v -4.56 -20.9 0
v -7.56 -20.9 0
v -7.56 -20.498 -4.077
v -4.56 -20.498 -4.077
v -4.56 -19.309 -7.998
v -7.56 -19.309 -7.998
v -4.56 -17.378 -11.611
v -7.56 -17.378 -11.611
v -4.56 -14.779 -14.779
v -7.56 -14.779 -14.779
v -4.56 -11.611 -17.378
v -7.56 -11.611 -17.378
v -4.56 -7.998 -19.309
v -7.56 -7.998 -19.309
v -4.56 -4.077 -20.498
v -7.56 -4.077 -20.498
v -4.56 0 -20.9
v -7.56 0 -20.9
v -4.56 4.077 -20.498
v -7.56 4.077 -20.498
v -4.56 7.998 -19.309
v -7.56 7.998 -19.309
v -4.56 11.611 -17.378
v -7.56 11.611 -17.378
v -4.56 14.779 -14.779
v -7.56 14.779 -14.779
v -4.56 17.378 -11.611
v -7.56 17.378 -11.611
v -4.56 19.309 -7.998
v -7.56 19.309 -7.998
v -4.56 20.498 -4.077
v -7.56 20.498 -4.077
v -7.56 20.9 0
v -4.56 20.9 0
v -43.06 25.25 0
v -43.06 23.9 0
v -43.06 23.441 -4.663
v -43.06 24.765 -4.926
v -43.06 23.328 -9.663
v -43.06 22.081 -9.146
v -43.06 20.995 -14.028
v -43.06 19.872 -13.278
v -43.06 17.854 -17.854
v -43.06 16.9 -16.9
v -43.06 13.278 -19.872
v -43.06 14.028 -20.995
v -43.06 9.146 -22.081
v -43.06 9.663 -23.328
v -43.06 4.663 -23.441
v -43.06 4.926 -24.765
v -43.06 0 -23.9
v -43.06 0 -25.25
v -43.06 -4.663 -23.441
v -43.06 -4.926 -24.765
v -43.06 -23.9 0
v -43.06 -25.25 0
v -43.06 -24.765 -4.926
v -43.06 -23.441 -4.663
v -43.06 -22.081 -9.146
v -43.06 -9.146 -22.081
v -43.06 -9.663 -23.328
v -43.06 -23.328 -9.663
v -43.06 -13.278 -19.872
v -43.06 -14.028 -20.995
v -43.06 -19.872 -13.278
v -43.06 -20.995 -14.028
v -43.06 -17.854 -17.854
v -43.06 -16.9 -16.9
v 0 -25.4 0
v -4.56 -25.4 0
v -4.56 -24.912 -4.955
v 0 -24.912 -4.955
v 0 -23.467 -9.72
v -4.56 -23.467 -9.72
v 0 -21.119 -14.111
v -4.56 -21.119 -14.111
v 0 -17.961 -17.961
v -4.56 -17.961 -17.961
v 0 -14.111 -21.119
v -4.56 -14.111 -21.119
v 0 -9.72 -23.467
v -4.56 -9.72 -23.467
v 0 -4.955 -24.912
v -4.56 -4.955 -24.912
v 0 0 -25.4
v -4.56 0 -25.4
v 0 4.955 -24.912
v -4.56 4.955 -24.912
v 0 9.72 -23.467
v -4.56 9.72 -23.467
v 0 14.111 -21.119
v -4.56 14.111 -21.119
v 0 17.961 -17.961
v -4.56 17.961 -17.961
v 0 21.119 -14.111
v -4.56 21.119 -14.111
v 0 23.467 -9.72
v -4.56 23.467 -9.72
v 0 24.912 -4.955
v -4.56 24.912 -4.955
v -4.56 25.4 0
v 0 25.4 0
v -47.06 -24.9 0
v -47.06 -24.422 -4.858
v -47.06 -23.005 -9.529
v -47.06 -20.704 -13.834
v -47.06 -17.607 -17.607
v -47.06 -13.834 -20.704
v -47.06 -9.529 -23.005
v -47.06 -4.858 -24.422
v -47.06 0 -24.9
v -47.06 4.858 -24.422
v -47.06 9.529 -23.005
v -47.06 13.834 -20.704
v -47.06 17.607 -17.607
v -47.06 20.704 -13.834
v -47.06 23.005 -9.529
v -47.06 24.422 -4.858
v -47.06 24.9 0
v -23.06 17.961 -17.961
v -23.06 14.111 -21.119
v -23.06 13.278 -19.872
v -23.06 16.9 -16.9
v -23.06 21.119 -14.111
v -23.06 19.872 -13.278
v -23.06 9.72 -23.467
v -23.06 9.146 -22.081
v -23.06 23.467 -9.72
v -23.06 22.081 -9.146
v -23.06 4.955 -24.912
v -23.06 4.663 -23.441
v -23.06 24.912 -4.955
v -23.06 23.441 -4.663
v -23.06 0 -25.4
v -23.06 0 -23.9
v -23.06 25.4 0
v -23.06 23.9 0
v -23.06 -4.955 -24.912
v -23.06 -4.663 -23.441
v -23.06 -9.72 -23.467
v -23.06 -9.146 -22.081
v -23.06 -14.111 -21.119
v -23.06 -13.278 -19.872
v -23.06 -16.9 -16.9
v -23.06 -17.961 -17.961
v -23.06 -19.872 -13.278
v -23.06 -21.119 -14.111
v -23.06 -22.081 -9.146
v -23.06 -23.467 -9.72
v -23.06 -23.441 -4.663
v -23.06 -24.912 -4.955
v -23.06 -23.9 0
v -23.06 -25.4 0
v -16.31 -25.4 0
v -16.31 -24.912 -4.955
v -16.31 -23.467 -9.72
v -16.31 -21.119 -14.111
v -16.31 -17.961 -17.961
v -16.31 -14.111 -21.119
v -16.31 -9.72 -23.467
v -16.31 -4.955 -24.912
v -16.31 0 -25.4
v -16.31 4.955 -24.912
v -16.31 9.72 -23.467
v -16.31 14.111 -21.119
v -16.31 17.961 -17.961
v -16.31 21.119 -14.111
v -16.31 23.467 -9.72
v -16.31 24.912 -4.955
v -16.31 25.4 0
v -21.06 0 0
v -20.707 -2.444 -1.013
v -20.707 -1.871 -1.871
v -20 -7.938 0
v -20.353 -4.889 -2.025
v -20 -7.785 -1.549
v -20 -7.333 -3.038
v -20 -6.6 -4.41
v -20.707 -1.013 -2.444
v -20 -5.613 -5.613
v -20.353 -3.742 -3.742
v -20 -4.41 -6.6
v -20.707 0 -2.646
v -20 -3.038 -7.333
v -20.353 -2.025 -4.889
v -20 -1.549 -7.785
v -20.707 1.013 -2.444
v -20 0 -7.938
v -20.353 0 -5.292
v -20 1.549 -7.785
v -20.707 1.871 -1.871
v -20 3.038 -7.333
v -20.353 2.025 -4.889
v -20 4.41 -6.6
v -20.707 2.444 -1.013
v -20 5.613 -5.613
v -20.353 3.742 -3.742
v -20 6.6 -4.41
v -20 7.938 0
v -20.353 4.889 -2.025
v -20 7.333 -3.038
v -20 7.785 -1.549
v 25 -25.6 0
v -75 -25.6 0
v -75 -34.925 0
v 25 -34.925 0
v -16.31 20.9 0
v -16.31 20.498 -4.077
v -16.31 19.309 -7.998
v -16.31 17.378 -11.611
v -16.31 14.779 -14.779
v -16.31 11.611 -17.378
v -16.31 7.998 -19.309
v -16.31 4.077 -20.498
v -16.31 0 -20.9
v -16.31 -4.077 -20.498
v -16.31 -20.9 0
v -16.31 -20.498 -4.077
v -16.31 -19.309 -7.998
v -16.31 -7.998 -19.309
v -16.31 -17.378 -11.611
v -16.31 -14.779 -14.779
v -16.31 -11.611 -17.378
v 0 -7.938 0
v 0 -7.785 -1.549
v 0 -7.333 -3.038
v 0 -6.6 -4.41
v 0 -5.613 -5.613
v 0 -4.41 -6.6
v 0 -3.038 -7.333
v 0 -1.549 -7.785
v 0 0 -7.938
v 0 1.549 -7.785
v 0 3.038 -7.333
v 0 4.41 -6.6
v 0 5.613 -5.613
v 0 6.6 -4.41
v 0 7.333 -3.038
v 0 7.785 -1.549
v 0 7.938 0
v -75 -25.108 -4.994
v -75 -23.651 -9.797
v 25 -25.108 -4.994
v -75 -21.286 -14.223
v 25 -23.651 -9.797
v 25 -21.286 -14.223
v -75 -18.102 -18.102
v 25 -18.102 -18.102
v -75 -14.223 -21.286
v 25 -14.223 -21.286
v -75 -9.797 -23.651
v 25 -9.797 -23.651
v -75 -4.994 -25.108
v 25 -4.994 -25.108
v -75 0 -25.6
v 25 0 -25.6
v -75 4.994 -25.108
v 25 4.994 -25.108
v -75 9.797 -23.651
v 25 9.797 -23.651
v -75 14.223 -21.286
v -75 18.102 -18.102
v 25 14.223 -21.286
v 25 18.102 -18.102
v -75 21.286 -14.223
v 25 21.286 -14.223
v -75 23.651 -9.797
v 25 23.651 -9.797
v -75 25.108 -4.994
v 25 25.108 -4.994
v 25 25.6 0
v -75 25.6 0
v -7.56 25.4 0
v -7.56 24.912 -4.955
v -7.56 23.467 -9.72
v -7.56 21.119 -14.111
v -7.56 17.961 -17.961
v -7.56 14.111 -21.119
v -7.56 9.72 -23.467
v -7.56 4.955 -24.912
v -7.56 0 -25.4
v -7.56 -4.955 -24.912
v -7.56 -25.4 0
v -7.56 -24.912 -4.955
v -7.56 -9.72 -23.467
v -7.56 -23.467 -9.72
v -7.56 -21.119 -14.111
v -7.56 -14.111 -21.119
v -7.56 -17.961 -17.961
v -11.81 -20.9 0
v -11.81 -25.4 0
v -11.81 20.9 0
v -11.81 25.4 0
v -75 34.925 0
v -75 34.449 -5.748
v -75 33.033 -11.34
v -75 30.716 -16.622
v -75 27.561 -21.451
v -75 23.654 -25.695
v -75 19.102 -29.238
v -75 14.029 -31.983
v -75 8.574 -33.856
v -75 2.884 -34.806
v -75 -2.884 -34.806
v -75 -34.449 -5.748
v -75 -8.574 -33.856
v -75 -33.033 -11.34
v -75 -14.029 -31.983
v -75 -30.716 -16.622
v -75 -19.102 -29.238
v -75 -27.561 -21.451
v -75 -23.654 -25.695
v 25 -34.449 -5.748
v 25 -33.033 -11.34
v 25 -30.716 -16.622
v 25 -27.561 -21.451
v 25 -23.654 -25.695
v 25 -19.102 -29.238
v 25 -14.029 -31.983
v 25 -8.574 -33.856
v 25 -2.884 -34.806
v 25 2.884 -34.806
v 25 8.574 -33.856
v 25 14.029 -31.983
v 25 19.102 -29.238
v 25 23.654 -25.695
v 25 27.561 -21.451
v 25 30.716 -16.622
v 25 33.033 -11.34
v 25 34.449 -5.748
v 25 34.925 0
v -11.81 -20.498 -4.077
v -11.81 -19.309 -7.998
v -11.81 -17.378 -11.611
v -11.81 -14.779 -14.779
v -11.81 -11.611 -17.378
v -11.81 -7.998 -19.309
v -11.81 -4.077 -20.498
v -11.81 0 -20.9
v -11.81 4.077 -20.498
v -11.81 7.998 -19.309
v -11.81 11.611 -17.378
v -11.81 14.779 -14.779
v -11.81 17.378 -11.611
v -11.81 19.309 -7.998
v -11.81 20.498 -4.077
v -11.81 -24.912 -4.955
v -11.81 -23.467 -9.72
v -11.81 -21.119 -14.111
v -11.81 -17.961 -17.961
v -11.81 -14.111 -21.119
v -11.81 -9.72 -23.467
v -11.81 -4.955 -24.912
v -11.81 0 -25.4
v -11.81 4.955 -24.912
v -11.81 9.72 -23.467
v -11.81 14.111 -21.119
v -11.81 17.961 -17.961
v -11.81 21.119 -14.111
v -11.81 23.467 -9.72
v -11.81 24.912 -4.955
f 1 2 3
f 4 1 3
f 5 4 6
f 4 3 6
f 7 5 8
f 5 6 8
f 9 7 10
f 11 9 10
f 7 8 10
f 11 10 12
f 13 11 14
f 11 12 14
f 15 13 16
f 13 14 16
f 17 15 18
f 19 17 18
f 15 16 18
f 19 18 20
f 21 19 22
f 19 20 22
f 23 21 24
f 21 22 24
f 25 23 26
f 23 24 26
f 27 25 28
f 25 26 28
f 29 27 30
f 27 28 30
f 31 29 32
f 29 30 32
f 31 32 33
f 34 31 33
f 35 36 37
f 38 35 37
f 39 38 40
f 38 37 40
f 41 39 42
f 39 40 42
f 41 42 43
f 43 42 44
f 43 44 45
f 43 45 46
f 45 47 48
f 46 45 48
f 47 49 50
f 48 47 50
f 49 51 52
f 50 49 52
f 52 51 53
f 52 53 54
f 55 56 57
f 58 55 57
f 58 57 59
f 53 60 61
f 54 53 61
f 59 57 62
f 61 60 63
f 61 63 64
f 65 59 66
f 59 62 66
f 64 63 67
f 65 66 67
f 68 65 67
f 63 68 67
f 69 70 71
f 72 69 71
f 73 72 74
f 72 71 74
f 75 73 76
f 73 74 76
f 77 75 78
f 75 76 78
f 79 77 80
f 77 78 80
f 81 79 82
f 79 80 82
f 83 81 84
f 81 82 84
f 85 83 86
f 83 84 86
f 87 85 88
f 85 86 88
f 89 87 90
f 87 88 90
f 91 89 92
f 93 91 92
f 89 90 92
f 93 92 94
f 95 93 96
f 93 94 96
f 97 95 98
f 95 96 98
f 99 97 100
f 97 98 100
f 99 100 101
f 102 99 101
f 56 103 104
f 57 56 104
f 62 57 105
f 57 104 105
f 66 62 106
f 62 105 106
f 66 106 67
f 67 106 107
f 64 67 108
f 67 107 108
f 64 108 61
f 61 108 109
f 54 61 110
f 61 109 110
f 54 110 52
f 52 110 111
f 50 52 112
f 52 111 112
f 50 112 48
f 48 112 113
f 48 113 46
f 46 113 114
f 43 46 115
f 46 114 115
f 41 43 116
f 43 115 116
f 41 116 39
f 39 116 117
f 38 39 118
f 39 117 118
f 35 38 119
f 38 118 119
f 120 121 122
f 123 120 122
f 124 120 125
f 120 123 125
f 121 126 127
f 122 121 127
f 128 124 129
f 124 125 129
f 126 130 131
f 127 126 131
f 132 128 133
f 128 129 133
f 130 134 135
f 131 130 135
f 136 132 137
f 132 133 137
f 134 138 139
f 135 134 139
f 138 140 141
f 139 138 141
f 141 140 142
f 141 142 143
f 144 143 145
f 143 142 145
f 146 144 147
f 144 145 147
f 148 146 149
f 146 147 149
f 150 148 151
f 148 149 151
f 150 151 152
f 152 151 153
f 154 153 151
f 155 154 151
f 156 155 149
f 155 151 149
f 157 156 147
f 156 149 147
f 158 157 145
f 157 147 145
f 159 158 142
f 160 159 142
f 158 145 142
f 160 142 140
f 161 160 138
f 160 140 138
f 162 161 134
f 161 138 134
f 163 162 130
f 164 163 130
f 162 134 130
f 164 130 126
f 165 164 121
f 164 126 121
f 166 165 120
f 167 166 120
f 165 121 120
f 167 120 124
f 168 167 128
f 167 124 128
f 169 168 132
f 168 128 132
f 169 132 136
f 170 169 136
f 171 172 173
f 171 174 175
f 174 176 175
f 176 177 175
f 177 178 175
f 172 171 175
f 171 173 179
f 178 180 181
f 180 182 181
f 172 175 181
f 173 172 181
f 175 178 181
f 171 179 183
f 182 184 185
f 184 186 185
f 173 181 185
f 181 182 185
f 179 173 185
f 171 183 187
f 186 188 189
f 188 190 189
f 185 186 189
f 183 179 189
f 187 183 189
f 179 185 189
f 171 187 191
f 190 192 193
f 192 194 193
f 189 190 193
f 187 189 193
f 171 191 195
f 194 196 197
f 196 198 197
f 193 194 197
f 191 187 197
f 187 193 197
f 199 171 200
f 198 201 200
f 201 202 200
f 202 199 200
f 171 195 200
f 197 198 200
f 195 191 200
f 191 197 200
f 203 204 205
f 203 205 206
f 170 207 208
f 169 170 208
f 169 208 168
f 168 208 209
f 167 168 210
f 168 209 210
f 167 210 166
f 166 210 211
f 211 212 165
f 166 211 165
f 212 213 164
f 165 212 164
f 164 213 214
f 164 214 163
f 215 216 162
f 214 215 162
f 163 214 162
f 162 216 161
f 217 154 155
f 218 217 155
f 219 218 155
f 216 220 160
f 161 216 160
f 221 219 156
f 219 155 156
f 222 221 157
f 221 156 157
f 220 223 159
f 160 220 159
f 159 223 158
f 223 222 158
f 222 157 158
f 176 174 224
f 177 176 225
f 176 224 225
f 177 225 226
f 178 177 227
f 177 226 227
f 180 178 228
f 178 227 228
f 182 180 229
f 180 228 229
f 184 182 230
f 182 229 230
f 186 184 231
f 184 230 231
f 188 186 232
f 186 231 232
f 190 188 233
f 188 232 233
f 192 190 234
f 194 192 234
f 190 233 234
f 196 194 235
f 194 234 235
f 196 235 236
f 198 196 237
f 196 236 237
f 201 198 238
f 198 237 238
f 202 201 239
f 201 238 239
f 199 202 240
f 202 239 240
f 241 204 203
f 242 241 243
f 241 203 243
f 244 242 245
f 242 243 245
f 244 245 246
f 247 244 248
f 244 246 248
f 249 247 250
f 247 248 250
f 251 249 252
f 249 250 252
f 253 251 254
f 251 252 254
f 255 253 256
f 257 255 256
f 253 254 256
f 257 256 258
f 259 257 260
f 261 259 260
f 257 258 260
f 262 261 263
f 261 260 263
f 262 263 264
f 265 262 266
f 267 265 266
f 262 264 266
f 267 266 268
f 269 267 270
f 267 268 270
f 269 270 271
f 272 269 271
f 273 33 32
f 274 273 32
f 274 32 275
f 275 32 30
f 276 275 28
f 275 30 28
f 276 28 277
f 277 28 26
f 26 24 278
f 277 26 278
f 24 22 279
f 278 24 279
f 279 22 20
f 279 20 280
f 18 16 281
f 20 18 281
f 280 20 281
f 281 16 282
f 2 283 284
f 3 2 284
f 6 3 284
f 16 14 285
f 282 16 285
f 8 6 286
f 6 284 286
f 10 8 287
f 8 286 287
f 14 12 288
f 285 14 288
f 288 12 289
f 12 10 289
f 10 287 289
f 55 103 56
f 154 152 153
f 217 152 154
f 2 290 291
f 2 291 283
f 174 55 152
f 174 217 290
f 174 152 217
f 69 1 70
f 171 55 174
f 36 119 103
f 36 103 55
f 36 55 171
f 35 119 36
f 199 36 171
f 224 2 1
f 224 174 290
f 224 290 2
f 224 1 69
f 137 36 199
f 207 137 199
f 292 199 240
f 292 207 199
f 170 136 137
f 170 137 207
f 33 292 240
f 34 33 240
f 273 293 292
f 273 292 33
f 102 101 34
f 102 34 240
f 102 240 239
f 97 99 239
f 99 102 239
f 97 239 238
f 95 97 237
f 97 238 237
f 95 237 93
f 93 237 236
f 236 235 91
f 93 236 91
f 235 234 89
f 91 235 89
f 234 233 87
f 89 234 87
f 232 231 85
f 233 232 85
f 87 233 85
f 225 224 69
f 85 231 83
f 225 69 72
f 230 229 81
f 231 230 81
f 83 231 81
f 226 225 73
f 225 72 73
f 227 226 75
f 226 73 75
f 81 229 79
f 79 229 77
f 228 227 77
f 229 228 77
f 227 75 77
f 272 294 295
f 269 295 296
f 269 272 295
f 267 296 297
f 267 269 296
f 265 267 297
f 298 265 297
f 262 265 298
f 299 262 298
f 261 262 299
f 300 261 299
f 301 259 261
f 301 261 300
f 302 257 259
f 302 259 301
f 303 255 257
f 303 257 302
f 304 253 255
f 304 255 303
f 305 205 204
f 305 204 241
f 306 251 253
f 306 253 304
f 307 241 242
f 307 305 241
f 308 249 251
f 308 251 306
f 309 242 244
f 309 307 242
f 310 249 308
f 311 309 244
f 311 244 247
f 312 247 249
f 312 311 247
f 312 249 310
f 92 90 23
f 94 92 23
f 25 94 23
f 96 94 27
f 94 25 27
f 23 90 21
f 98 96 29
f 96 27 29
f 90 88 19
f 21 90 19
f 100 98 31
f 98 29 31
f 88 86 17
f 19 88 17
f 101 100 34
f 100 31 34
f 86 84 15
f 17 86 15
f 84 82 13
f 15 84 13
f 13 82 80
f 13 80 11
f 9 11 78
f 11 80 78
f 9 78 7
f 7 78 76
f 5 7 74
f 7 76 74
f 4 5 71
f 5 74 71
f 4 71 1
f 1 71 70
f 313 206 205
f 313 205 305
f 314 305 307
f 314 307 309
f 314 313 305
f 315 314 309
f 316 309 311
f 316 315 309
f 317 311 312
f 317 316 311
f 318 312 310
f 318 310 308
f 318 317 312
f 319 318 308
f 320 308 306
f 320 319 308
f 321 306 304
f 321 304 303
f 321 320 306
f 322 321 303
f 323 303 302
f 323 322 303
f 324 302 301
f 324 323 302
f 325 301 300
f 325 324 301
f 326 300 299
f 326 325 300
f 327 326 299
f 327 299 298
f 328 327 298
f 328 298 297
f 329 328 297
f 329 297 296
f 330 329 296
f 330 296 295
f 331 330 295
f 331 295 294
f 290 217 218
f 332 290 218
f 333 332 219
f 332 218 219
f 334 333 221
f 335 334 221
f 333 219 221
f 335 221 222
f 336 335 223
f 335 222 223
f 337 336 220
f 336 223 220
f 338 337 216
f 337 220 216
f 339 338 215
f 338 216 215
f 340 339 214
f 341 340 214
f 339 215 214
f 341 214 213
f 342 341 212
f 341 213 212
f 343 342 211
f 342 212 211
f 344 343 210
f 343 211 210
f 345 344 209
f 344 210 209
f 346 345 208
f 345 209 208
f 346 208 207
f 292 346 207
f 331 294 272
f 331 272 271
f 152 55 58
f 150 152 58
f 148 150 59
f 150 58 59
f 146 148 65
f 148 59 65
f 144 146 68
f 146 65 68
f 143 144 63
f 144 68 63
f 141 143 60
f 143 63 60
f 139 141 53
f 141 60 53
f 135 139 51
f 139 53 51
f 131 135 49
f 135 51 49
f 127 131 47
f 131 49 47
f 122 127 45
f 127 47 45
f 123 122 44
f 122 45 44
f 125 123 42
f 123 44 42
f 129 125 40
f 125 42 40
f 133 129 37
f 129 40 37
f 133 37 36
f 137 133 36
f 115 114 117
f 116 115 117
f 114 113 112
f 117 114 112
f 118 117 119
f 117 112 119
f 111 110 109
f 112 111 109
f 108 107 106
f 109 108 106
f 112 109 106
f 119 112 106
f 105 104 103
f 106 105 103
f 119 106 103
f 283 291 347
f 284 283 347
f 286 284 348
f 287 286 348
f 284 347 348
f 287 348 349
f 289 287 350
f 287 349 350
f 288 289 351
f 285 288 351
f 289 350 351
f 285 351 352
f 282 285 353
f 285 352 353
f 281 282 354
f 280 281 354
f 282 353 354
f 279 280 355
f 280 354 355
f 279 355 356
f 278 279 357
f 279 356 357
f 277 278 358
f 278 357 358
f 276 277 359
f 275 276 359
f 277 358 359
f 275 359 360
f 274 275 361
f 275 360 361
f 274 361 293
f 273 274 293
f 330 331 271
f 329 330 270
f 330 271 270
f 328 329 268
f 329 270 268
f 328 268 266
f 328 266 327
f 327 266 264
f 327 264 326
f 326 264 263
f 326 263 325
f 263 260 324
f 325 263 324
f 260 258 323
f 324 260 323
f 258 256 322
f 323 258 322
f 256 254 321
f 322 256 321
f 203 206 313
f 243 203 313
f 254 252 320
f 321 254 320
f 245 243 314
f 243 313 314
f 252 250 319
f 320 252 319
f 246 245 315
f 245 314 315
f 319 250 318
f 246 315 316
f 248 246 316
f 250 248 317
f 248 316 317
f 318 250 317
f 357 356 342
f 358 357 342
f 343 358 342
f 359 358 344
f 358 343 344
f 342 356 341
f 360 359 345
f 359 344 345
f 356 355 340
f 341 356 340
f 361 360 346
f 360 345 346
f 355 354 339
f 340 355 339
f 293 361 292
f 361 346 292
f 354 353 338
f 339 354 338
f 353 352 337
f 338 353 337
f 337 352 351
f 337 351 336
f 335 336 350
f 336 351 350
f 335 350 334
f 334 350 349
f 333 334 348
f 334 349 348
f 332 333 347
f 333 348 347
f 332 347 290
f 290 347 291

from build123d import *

# Parameters (mm, degrees)
SKETCH3_W          = 100
SKETCH3_H          = 9.325
SKETCH4_W          = 119
SKETCH4_H          = 90
CUT_EXTRUDE1_DEPTH = 90.802623848
SKETCH5_W          = 115
SKETCH5_H          = 80
CUT_EXTRUDE2_DEPTH = 90.802623848


with BuildPart() as part:
    # Sketch1 → Revolve1 (revolve)
    with BuildSketch(Plane.XY, mode=Mode.PRIVATE) as revolve1_sk:
        Polygon((-43.06, 25.25), (-47.06, 24.9), (-47.06, 0), (-21.06, 0), (-20, 7.9375), (0, 7.9375), (0, 25.4), (-4.56, 25.4), (-4.56, 20.9), (-7.56, 20.9), (-7.56, 25.4), (-11.81, 25.4), (-11.81, 20.9), (-16.31, 20.9), (-16.31, 25.4), (-23.06, 25.4), (-23.06, 23.9), (-43.06, 23.9), align=None)
    revolve(revolve1_sk.sketch.rotate(Axis((-47.06, 0, 0), (1, 0, 0)), 90), axis=Axis((-47.06, 0, 0), (1, 0, 0)))

    # Sketch4 → Cut-Extrude1 (cut, through all)
    with BuildSketch(Plane.XY):
        with Locations((-24.5, 0)):
            Rectangle(SKETCH4_W, SKETCH4_H)
    extrude(amount=CUT_EXTRUDE1_DEPTH, mode=Mode.SUBTRACT)


with BuildPart() as body_2:
    # Sketch3 → Revolve2 (revolve)
    with BuildSketch(Plane.XY, mode=Mode.PRIVATE) as revolve2_sk:
        with Locations((-25, 30.2625)):
            Rectangle(SKETCH3_W, SKETCH3_H)
    revolve(revolve2_sk.sketch.rotate(Axis((-80, 0, 0), (1, 0, 0)), 90), axis=Axis((-80, 0, 0), (1, 0, 0)))

    # Sketch5 → Cut-Extrude2 (cut, through all)
    with BuildSketch(Plane.XY):
        with Locations((-27.5, 0)):
            Rectangle(SKETCH5_W, SKETCH5_H)
    extrude(amount=CUT_EXTRUDE2_DEPTH, mode=Mode.SUBTRACT)


solid = Compound([part.part, body_2.part])
